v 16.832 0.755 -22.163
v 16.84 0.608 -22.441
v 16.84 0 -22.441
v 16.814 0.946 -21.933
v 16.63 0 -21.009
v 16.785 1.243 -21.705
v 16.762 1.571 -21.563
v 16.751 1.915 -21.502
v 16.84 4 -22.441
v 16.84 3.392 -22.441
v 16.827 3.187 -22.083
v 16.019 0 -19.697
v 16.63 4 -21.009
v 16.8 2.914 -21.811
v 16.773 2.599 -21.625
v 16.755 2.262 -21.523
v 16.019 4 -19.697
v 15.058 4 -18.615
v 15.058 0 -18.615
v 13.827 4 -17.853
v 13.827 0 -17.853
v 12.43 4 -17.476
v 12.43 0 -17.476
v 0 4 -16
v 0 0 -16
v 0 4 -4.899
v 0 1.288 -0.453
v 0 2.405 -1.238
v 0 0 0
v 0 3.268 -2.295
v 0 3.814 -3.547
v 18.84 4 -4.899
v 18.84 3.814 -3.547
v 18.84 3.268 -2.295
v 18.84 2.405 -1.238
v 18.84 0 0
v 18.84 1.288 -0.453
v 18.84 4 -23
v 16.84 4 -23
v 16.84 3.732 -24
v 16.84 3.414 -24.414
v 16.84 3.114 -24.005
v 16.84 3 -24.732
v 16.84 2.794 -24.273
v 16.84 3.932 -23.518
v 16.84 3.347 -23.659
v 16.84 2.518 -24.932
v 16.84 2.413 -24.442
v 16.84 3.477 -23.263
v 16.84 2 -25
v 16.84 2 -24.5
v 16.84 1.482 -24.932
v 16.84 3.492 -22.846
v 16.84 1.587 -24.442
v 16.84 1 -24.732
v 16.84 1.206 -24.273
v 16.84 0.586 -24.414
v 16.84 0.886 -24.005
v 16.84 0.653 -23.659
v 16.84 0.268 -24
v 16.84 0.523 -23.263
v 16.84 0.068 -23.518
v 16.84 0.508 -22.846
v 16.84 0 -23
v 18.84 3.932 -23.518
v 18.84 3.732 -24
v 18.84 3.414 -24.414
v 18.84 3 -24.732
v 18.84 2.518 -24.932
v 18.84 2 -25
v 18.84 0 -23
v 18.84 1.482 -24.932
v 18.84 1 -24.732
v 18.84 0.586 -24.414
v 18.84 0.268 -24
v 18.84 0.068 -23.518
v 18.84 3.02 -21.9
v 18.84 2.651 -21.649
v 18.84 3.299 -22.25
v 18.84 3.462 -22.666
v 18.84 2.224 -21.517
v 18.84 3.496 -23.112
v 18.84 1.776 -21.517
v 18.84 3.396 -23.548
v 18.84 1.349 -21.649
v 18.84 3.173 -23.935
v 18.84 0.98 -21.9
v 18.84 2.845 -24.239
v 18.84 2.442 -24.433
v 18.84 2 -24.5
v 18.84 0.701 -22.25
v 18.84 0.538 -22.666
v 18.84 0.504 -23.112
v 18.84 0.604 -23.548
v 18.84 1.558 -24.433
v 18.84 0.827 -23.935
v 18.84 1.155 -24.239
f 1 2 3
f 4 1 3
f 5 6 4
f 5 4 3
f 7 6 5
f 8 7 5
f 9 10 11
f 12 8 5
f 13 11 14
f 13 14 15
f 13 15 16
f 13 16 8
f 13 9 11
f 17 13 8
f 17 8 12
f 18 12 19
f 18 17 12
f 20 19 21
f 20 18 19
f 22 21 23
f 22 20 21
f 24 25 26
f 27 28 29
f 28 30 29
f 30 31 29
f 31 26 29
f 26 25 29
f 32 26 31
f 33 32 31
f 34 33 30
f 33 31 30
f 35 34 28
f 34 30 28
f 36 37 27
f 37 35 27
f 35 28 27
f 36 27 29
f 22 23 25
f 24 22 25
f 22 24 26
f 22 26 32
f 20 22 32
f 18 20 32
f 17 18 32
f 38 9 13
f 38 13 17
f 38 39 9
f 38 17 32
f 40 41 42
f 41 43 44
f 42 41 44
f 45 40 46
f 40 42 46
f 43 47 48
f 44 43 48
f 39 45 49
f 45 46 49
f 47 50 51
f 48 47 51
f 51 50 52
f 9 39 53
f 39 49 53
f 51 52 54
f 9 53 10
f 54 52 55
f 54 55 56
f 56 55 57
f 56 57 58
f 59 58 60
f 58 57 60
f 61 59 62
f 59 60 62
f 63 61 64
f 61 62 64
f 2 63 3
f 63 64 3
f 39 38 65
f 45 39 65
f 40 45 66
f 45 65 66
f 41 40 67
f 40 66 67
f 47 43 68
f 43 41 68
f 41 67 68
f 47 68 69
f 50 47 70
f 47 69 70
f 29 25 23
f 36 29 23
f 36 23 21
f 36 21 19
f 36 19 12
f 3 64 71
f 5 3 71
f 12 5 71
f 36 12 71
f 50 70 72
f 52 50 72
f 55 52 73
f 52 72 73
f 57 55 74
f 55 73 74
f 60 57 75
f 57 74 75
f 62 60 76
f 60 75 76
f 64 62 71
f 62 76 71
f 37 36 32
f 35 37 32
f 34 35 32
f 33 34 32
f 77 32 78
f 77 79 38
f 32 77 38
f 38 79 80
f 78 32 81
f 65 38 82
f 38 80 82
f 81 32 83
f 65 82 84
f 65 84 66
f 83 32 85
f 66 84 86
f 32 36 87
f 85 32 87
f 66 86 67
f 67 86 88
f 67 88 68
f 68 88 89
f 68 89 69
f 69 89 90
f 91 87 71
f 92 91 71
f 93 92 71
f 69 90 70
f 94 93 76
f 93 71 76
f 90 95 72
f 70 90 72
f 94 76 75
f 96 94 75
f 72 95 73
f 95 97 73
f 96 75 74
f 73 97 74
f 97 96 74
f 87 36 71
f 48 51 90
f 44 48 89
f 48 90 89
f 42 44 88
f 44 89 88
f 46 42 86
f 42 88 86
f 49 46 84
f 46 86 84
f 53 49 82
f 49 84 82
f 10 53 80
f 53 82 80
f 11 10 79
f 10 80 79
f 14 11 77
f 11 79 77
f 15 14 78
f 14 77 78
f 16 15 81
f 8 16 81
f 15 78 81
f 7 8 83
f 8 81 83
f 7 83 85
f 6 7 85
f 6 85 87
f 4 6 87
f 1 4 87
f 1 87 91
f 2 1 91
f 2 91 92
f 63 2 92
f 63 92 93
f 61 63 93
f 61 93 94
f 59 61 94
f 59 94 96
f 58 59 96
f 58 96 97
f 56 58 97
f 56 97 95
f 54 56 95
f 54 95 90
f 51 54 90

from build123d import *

# Parameters (mm, degrees)
BOSS_EXTRUDE1_DEPTH = 4
FILLET1_R           = 5
FILLET2_R           = 5
SKETCH6_R           = 1.5
CUT_EXTRUDE1_DEPTH  = 32.558605799


with BuildPart() as part:
    # Sketch2 → Boss-Extrude1 (new body)
    with BuildSketch(Plane(origin=(0, 0, 0), x_dir=(1, 0, 0), z_dir=(0, 1, 0))):
        Polygon((0, 0), (18.84, 0), (18.84, 25), (16.84, 25), (16.84, 18), (0, 16), align=None)
    extrude(amount=BOSS_EXTRUDE1_DEPTH)

    # Fillet1
    # the kernel refuses this fillet: 5 mm, written as the material it takes off along each edge
    with BuildSketch(Plane(origin=(-12.247448714, 4, 0), x_dir=(0, -1.0, -1.5634160632766466e-12), z_dir=(1, 0, 0))) as fillet1_piece_1:
        with BuildLine():
            CenterArc((5, 4.898979486), FILLET1_R, 180, 78.463040967)
            Line((0, 4.898979486), (-0.1, 4.898979486))
            Line((-0.1, 4.898979486), (-0.1, 0))
            Line((-0.1, 0), (0, -0.1))
            ThreePointArc((0, -0.1), (2, -0.1), (3.98, -0.09797959))
            Line((3.98, -0.09797959), (4, 0))
        make_face()
    extrude(amount=43.334897428, mode=Mode.SUBTRACT)

    # Fillet2
    fillet2_edges = [part.edges().sort_by_distance(p)[0] for p in [
        (16.84, 2, -18),
    ]]
    fillet(fillet2_edges, radius=FILLET2_R)

    # Sketch6 → Cut-Extrude1 (cut, through all)
    with BuildSketch(Plane(origin=(18.84, 0, 0), x_dir=(0, 0, -1), z_dir=(1, 0, 0))):
        with Locations((23, 2)):
            Circle(SKETCH6_R)
        with BuildLine():
            Line((25, 4), (23, 4))
            ThreePointArc((23, 4), (24.414213562, 3.414213562), (25, 2))
            Line((25, 2), (25, 4))
        make_face()
        with BuildLine():
            Line((25, 0), (25, 2))
            ThreePointArc((25, 2), (24.414213562, 0.585786438), (23, 0))
            Line((23, 0), (25, 0))
        make_face()
    extrude(amount=-CUT_EXTRUDE1_DEPTH, mode=Mode.SUBTRACT)


solid = part.part
